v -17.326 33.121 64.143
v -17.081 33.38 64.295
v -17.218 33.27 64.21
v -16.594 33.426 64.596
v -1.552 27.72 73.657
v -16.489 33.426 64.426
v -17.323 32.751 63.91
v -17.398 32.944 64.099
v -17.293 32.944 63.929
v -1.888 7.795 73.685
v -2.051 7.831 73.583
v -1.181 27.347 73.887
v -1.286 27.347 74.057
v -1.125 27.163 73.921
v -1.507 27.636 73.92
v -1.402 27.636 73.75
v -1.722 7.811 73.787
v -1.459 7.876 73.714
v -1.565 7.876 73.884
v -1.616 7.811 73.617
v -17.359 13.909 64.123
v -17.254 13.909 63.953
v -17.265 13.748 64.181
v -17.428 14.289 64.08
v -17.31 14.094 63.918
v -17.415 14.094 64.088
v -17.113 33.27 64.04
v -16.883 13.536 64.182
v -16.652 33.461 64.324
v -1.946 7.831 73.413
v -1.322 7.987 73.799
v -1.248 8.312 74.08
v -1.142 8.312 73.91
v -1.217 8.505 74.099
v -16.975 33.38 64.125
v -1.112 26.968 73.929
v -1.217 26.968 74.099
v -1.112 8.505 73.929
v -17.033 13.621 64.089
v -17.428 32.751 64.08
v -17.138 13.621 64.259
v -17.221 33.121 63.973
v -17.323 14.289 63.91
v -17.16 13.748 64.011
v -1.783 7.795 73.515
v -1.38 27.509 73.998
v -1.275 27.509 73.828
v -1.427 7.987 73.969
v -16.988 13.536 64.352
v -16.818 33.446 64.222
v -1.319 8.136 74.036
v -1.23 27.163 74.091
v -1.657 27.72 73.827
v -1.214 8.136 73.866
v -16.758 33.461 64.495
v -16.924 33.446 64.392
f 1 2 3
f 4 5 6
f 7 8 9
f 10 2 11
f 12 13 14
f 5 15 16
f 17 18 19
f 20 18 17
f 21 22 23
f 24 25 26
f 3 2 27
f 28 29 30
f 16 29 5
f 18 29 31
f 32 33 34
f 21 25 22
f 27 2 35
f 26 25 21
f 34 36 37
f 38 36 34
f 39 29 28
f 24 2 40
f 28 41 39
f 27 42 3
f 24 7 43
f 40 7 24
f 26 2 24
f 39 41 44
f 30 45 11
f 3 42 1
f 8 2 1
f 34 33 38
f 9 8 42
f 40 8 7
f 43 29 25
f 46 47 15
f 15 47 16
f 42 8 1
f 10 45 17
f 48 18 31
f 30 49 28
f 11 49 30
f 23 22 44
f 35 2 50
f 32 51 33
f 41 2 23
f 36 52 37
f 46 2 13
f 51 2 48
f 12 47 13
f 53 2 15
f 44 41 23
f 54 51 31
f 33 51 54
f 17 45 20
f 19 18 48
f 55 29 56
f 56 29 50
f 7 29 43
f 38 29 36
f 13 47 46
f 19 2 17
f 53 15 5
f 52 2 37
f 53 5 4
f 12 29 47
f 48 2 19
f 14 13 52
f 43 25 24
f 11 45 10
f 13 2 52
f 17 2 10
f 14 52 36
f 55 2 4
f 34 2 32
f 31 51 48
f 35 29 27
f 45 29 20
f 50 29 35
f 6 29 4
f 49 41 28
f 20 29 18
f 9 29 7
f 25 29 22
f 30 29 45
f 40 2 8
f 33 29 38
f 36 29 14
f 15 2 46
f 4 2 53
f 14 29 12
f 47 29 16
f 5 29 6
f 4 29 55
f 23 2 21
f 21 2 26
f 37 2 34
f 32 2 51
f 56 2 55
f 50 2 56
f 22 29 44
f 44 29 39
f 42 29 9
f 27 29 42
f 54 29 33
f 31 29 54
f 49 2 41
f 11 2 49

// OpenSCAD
// file: def.scad
inf = 1000;

round_radius = 1;
sticker_margin = 2.5;
sticker_round_radius = 0.75;

phi = (sqrt(5) + 1) / 2;
outer_radius = 80;
edge_length = outer_radius / sqrt(phi * phi * phi * phi + 1) * 2;
inner_radius = sqrt(outer_radius * outer_radius - (edge_length / 2 / cos(54)) * (edge_length / 2 / cos(54)));
cut1_length = edge_length / (1 / (phi * phi) + 2) * 3;
center_cut_length = edge_length * (sin(54) + 1);
cut1_dis = inner_radius * (center_cut_length - cut1_length) / (center_cut_length - edge_length);

theta = atan(edge_length / 2 * tan(54) / inner_radius);

face_inner_radius = edge_length / 2 * tan(54);
face_center_length = edge_length * tan(54) / cos(18);
sticker_cut1_dis = face_inner_radius * (face_center_length - cut1_length) / (face_center_length - edge_length);
sticker_dif_cut1_dis = sticker_cut1_dis - round_radius * tan(theta) + round_radius - sticker_margin;
sticker_int_cut1_dis = sticker_cut1_dis + round_radius / tan(theta) - round_radius + sticker_margin;
sticker_dif_cut2_dis = face_inner_radius - round_radius * tan(theta) + round_radius - sticker_margin;

module _int_cut1() {
    translate([-inf, -inf, cut1_dis + round_radius])
        cube([inf * 2, inf * 2, inf]);
}

module _dif_cut1() {
    translate([-inf, -inf, cut1_dis - round_radius])
        cube([inf * 2, inf * 2, inf]);
}

module _sticker_int_cut1() {
    rotate([-90, 0, 0])
        translate([-inf, -inf, sticker_int_cut1_dis])
            cube([inf * 2, inf * 2, inf]);
}

module _sticker_dif_cut1() {
    rotate([-90, 0, 0])
        translate([-inf, -inf, sticker_dif_cut1_dis])
            cube([inf * 2, inf * 2, inf]);
}

module _sticker_dif_cut2() {
    rotate([-90, 0, 0])
        translate([-inf, -inf, sticker_dif_cut2_dis])
            cube([inf * 2, inf * 2, inf]);
}

module _base() {
    intersection_for(vec = [[0, 0, 0], [90, 90, 0], [90, 0, 90]])
        intersection_for(ang = [theta, -theta, 180 + theta, 180 - theta])
            rotate(vec)
                rotate([0, ang, 0])
                    translate([-inf, -inf, -inner_radius + round_radius])
                        cube([inf * 2, inf * 2, inf]);
}

module _sticker_base() {
    difference() {
        cube([inf, inf, 0.1], center = true);
        for (ang = [0 : 72 : 288])
            rotate([0, 0, ang])
                _sticker_dif_cut2();
    }
}

module _selector_base(dis) {
    intersection_for(vec = [[0, 0, 0], [90, 90, 0], [90, 0, 90]])
        intersection_for(ang = [theta, -theta, 180 + theta, 180 - theta])
            rotate(vec)
                rotate([0, ang, 0])
                    translate([-inf, -inf, -dis])
                        cube([inf * 2, inf * 2, inf]);
}
// main file
include <def.scad>

module corner_sticker() {
    minkowski() {
        intersection() {
            _sticker_base();
            intersection_for(ang = [0, -72])
                rotate([0, 0, ang])
                    _sticker_int_cut1();
        }
        cylinder(r = sticker_round_radius, h = 0.1, center = true, $fn = 24);
    }
}

rotate([0, -theta, 0])
    translate([0, 0, inner_radius])
        rotate([0, 0, -18])
            corner_sticker();
